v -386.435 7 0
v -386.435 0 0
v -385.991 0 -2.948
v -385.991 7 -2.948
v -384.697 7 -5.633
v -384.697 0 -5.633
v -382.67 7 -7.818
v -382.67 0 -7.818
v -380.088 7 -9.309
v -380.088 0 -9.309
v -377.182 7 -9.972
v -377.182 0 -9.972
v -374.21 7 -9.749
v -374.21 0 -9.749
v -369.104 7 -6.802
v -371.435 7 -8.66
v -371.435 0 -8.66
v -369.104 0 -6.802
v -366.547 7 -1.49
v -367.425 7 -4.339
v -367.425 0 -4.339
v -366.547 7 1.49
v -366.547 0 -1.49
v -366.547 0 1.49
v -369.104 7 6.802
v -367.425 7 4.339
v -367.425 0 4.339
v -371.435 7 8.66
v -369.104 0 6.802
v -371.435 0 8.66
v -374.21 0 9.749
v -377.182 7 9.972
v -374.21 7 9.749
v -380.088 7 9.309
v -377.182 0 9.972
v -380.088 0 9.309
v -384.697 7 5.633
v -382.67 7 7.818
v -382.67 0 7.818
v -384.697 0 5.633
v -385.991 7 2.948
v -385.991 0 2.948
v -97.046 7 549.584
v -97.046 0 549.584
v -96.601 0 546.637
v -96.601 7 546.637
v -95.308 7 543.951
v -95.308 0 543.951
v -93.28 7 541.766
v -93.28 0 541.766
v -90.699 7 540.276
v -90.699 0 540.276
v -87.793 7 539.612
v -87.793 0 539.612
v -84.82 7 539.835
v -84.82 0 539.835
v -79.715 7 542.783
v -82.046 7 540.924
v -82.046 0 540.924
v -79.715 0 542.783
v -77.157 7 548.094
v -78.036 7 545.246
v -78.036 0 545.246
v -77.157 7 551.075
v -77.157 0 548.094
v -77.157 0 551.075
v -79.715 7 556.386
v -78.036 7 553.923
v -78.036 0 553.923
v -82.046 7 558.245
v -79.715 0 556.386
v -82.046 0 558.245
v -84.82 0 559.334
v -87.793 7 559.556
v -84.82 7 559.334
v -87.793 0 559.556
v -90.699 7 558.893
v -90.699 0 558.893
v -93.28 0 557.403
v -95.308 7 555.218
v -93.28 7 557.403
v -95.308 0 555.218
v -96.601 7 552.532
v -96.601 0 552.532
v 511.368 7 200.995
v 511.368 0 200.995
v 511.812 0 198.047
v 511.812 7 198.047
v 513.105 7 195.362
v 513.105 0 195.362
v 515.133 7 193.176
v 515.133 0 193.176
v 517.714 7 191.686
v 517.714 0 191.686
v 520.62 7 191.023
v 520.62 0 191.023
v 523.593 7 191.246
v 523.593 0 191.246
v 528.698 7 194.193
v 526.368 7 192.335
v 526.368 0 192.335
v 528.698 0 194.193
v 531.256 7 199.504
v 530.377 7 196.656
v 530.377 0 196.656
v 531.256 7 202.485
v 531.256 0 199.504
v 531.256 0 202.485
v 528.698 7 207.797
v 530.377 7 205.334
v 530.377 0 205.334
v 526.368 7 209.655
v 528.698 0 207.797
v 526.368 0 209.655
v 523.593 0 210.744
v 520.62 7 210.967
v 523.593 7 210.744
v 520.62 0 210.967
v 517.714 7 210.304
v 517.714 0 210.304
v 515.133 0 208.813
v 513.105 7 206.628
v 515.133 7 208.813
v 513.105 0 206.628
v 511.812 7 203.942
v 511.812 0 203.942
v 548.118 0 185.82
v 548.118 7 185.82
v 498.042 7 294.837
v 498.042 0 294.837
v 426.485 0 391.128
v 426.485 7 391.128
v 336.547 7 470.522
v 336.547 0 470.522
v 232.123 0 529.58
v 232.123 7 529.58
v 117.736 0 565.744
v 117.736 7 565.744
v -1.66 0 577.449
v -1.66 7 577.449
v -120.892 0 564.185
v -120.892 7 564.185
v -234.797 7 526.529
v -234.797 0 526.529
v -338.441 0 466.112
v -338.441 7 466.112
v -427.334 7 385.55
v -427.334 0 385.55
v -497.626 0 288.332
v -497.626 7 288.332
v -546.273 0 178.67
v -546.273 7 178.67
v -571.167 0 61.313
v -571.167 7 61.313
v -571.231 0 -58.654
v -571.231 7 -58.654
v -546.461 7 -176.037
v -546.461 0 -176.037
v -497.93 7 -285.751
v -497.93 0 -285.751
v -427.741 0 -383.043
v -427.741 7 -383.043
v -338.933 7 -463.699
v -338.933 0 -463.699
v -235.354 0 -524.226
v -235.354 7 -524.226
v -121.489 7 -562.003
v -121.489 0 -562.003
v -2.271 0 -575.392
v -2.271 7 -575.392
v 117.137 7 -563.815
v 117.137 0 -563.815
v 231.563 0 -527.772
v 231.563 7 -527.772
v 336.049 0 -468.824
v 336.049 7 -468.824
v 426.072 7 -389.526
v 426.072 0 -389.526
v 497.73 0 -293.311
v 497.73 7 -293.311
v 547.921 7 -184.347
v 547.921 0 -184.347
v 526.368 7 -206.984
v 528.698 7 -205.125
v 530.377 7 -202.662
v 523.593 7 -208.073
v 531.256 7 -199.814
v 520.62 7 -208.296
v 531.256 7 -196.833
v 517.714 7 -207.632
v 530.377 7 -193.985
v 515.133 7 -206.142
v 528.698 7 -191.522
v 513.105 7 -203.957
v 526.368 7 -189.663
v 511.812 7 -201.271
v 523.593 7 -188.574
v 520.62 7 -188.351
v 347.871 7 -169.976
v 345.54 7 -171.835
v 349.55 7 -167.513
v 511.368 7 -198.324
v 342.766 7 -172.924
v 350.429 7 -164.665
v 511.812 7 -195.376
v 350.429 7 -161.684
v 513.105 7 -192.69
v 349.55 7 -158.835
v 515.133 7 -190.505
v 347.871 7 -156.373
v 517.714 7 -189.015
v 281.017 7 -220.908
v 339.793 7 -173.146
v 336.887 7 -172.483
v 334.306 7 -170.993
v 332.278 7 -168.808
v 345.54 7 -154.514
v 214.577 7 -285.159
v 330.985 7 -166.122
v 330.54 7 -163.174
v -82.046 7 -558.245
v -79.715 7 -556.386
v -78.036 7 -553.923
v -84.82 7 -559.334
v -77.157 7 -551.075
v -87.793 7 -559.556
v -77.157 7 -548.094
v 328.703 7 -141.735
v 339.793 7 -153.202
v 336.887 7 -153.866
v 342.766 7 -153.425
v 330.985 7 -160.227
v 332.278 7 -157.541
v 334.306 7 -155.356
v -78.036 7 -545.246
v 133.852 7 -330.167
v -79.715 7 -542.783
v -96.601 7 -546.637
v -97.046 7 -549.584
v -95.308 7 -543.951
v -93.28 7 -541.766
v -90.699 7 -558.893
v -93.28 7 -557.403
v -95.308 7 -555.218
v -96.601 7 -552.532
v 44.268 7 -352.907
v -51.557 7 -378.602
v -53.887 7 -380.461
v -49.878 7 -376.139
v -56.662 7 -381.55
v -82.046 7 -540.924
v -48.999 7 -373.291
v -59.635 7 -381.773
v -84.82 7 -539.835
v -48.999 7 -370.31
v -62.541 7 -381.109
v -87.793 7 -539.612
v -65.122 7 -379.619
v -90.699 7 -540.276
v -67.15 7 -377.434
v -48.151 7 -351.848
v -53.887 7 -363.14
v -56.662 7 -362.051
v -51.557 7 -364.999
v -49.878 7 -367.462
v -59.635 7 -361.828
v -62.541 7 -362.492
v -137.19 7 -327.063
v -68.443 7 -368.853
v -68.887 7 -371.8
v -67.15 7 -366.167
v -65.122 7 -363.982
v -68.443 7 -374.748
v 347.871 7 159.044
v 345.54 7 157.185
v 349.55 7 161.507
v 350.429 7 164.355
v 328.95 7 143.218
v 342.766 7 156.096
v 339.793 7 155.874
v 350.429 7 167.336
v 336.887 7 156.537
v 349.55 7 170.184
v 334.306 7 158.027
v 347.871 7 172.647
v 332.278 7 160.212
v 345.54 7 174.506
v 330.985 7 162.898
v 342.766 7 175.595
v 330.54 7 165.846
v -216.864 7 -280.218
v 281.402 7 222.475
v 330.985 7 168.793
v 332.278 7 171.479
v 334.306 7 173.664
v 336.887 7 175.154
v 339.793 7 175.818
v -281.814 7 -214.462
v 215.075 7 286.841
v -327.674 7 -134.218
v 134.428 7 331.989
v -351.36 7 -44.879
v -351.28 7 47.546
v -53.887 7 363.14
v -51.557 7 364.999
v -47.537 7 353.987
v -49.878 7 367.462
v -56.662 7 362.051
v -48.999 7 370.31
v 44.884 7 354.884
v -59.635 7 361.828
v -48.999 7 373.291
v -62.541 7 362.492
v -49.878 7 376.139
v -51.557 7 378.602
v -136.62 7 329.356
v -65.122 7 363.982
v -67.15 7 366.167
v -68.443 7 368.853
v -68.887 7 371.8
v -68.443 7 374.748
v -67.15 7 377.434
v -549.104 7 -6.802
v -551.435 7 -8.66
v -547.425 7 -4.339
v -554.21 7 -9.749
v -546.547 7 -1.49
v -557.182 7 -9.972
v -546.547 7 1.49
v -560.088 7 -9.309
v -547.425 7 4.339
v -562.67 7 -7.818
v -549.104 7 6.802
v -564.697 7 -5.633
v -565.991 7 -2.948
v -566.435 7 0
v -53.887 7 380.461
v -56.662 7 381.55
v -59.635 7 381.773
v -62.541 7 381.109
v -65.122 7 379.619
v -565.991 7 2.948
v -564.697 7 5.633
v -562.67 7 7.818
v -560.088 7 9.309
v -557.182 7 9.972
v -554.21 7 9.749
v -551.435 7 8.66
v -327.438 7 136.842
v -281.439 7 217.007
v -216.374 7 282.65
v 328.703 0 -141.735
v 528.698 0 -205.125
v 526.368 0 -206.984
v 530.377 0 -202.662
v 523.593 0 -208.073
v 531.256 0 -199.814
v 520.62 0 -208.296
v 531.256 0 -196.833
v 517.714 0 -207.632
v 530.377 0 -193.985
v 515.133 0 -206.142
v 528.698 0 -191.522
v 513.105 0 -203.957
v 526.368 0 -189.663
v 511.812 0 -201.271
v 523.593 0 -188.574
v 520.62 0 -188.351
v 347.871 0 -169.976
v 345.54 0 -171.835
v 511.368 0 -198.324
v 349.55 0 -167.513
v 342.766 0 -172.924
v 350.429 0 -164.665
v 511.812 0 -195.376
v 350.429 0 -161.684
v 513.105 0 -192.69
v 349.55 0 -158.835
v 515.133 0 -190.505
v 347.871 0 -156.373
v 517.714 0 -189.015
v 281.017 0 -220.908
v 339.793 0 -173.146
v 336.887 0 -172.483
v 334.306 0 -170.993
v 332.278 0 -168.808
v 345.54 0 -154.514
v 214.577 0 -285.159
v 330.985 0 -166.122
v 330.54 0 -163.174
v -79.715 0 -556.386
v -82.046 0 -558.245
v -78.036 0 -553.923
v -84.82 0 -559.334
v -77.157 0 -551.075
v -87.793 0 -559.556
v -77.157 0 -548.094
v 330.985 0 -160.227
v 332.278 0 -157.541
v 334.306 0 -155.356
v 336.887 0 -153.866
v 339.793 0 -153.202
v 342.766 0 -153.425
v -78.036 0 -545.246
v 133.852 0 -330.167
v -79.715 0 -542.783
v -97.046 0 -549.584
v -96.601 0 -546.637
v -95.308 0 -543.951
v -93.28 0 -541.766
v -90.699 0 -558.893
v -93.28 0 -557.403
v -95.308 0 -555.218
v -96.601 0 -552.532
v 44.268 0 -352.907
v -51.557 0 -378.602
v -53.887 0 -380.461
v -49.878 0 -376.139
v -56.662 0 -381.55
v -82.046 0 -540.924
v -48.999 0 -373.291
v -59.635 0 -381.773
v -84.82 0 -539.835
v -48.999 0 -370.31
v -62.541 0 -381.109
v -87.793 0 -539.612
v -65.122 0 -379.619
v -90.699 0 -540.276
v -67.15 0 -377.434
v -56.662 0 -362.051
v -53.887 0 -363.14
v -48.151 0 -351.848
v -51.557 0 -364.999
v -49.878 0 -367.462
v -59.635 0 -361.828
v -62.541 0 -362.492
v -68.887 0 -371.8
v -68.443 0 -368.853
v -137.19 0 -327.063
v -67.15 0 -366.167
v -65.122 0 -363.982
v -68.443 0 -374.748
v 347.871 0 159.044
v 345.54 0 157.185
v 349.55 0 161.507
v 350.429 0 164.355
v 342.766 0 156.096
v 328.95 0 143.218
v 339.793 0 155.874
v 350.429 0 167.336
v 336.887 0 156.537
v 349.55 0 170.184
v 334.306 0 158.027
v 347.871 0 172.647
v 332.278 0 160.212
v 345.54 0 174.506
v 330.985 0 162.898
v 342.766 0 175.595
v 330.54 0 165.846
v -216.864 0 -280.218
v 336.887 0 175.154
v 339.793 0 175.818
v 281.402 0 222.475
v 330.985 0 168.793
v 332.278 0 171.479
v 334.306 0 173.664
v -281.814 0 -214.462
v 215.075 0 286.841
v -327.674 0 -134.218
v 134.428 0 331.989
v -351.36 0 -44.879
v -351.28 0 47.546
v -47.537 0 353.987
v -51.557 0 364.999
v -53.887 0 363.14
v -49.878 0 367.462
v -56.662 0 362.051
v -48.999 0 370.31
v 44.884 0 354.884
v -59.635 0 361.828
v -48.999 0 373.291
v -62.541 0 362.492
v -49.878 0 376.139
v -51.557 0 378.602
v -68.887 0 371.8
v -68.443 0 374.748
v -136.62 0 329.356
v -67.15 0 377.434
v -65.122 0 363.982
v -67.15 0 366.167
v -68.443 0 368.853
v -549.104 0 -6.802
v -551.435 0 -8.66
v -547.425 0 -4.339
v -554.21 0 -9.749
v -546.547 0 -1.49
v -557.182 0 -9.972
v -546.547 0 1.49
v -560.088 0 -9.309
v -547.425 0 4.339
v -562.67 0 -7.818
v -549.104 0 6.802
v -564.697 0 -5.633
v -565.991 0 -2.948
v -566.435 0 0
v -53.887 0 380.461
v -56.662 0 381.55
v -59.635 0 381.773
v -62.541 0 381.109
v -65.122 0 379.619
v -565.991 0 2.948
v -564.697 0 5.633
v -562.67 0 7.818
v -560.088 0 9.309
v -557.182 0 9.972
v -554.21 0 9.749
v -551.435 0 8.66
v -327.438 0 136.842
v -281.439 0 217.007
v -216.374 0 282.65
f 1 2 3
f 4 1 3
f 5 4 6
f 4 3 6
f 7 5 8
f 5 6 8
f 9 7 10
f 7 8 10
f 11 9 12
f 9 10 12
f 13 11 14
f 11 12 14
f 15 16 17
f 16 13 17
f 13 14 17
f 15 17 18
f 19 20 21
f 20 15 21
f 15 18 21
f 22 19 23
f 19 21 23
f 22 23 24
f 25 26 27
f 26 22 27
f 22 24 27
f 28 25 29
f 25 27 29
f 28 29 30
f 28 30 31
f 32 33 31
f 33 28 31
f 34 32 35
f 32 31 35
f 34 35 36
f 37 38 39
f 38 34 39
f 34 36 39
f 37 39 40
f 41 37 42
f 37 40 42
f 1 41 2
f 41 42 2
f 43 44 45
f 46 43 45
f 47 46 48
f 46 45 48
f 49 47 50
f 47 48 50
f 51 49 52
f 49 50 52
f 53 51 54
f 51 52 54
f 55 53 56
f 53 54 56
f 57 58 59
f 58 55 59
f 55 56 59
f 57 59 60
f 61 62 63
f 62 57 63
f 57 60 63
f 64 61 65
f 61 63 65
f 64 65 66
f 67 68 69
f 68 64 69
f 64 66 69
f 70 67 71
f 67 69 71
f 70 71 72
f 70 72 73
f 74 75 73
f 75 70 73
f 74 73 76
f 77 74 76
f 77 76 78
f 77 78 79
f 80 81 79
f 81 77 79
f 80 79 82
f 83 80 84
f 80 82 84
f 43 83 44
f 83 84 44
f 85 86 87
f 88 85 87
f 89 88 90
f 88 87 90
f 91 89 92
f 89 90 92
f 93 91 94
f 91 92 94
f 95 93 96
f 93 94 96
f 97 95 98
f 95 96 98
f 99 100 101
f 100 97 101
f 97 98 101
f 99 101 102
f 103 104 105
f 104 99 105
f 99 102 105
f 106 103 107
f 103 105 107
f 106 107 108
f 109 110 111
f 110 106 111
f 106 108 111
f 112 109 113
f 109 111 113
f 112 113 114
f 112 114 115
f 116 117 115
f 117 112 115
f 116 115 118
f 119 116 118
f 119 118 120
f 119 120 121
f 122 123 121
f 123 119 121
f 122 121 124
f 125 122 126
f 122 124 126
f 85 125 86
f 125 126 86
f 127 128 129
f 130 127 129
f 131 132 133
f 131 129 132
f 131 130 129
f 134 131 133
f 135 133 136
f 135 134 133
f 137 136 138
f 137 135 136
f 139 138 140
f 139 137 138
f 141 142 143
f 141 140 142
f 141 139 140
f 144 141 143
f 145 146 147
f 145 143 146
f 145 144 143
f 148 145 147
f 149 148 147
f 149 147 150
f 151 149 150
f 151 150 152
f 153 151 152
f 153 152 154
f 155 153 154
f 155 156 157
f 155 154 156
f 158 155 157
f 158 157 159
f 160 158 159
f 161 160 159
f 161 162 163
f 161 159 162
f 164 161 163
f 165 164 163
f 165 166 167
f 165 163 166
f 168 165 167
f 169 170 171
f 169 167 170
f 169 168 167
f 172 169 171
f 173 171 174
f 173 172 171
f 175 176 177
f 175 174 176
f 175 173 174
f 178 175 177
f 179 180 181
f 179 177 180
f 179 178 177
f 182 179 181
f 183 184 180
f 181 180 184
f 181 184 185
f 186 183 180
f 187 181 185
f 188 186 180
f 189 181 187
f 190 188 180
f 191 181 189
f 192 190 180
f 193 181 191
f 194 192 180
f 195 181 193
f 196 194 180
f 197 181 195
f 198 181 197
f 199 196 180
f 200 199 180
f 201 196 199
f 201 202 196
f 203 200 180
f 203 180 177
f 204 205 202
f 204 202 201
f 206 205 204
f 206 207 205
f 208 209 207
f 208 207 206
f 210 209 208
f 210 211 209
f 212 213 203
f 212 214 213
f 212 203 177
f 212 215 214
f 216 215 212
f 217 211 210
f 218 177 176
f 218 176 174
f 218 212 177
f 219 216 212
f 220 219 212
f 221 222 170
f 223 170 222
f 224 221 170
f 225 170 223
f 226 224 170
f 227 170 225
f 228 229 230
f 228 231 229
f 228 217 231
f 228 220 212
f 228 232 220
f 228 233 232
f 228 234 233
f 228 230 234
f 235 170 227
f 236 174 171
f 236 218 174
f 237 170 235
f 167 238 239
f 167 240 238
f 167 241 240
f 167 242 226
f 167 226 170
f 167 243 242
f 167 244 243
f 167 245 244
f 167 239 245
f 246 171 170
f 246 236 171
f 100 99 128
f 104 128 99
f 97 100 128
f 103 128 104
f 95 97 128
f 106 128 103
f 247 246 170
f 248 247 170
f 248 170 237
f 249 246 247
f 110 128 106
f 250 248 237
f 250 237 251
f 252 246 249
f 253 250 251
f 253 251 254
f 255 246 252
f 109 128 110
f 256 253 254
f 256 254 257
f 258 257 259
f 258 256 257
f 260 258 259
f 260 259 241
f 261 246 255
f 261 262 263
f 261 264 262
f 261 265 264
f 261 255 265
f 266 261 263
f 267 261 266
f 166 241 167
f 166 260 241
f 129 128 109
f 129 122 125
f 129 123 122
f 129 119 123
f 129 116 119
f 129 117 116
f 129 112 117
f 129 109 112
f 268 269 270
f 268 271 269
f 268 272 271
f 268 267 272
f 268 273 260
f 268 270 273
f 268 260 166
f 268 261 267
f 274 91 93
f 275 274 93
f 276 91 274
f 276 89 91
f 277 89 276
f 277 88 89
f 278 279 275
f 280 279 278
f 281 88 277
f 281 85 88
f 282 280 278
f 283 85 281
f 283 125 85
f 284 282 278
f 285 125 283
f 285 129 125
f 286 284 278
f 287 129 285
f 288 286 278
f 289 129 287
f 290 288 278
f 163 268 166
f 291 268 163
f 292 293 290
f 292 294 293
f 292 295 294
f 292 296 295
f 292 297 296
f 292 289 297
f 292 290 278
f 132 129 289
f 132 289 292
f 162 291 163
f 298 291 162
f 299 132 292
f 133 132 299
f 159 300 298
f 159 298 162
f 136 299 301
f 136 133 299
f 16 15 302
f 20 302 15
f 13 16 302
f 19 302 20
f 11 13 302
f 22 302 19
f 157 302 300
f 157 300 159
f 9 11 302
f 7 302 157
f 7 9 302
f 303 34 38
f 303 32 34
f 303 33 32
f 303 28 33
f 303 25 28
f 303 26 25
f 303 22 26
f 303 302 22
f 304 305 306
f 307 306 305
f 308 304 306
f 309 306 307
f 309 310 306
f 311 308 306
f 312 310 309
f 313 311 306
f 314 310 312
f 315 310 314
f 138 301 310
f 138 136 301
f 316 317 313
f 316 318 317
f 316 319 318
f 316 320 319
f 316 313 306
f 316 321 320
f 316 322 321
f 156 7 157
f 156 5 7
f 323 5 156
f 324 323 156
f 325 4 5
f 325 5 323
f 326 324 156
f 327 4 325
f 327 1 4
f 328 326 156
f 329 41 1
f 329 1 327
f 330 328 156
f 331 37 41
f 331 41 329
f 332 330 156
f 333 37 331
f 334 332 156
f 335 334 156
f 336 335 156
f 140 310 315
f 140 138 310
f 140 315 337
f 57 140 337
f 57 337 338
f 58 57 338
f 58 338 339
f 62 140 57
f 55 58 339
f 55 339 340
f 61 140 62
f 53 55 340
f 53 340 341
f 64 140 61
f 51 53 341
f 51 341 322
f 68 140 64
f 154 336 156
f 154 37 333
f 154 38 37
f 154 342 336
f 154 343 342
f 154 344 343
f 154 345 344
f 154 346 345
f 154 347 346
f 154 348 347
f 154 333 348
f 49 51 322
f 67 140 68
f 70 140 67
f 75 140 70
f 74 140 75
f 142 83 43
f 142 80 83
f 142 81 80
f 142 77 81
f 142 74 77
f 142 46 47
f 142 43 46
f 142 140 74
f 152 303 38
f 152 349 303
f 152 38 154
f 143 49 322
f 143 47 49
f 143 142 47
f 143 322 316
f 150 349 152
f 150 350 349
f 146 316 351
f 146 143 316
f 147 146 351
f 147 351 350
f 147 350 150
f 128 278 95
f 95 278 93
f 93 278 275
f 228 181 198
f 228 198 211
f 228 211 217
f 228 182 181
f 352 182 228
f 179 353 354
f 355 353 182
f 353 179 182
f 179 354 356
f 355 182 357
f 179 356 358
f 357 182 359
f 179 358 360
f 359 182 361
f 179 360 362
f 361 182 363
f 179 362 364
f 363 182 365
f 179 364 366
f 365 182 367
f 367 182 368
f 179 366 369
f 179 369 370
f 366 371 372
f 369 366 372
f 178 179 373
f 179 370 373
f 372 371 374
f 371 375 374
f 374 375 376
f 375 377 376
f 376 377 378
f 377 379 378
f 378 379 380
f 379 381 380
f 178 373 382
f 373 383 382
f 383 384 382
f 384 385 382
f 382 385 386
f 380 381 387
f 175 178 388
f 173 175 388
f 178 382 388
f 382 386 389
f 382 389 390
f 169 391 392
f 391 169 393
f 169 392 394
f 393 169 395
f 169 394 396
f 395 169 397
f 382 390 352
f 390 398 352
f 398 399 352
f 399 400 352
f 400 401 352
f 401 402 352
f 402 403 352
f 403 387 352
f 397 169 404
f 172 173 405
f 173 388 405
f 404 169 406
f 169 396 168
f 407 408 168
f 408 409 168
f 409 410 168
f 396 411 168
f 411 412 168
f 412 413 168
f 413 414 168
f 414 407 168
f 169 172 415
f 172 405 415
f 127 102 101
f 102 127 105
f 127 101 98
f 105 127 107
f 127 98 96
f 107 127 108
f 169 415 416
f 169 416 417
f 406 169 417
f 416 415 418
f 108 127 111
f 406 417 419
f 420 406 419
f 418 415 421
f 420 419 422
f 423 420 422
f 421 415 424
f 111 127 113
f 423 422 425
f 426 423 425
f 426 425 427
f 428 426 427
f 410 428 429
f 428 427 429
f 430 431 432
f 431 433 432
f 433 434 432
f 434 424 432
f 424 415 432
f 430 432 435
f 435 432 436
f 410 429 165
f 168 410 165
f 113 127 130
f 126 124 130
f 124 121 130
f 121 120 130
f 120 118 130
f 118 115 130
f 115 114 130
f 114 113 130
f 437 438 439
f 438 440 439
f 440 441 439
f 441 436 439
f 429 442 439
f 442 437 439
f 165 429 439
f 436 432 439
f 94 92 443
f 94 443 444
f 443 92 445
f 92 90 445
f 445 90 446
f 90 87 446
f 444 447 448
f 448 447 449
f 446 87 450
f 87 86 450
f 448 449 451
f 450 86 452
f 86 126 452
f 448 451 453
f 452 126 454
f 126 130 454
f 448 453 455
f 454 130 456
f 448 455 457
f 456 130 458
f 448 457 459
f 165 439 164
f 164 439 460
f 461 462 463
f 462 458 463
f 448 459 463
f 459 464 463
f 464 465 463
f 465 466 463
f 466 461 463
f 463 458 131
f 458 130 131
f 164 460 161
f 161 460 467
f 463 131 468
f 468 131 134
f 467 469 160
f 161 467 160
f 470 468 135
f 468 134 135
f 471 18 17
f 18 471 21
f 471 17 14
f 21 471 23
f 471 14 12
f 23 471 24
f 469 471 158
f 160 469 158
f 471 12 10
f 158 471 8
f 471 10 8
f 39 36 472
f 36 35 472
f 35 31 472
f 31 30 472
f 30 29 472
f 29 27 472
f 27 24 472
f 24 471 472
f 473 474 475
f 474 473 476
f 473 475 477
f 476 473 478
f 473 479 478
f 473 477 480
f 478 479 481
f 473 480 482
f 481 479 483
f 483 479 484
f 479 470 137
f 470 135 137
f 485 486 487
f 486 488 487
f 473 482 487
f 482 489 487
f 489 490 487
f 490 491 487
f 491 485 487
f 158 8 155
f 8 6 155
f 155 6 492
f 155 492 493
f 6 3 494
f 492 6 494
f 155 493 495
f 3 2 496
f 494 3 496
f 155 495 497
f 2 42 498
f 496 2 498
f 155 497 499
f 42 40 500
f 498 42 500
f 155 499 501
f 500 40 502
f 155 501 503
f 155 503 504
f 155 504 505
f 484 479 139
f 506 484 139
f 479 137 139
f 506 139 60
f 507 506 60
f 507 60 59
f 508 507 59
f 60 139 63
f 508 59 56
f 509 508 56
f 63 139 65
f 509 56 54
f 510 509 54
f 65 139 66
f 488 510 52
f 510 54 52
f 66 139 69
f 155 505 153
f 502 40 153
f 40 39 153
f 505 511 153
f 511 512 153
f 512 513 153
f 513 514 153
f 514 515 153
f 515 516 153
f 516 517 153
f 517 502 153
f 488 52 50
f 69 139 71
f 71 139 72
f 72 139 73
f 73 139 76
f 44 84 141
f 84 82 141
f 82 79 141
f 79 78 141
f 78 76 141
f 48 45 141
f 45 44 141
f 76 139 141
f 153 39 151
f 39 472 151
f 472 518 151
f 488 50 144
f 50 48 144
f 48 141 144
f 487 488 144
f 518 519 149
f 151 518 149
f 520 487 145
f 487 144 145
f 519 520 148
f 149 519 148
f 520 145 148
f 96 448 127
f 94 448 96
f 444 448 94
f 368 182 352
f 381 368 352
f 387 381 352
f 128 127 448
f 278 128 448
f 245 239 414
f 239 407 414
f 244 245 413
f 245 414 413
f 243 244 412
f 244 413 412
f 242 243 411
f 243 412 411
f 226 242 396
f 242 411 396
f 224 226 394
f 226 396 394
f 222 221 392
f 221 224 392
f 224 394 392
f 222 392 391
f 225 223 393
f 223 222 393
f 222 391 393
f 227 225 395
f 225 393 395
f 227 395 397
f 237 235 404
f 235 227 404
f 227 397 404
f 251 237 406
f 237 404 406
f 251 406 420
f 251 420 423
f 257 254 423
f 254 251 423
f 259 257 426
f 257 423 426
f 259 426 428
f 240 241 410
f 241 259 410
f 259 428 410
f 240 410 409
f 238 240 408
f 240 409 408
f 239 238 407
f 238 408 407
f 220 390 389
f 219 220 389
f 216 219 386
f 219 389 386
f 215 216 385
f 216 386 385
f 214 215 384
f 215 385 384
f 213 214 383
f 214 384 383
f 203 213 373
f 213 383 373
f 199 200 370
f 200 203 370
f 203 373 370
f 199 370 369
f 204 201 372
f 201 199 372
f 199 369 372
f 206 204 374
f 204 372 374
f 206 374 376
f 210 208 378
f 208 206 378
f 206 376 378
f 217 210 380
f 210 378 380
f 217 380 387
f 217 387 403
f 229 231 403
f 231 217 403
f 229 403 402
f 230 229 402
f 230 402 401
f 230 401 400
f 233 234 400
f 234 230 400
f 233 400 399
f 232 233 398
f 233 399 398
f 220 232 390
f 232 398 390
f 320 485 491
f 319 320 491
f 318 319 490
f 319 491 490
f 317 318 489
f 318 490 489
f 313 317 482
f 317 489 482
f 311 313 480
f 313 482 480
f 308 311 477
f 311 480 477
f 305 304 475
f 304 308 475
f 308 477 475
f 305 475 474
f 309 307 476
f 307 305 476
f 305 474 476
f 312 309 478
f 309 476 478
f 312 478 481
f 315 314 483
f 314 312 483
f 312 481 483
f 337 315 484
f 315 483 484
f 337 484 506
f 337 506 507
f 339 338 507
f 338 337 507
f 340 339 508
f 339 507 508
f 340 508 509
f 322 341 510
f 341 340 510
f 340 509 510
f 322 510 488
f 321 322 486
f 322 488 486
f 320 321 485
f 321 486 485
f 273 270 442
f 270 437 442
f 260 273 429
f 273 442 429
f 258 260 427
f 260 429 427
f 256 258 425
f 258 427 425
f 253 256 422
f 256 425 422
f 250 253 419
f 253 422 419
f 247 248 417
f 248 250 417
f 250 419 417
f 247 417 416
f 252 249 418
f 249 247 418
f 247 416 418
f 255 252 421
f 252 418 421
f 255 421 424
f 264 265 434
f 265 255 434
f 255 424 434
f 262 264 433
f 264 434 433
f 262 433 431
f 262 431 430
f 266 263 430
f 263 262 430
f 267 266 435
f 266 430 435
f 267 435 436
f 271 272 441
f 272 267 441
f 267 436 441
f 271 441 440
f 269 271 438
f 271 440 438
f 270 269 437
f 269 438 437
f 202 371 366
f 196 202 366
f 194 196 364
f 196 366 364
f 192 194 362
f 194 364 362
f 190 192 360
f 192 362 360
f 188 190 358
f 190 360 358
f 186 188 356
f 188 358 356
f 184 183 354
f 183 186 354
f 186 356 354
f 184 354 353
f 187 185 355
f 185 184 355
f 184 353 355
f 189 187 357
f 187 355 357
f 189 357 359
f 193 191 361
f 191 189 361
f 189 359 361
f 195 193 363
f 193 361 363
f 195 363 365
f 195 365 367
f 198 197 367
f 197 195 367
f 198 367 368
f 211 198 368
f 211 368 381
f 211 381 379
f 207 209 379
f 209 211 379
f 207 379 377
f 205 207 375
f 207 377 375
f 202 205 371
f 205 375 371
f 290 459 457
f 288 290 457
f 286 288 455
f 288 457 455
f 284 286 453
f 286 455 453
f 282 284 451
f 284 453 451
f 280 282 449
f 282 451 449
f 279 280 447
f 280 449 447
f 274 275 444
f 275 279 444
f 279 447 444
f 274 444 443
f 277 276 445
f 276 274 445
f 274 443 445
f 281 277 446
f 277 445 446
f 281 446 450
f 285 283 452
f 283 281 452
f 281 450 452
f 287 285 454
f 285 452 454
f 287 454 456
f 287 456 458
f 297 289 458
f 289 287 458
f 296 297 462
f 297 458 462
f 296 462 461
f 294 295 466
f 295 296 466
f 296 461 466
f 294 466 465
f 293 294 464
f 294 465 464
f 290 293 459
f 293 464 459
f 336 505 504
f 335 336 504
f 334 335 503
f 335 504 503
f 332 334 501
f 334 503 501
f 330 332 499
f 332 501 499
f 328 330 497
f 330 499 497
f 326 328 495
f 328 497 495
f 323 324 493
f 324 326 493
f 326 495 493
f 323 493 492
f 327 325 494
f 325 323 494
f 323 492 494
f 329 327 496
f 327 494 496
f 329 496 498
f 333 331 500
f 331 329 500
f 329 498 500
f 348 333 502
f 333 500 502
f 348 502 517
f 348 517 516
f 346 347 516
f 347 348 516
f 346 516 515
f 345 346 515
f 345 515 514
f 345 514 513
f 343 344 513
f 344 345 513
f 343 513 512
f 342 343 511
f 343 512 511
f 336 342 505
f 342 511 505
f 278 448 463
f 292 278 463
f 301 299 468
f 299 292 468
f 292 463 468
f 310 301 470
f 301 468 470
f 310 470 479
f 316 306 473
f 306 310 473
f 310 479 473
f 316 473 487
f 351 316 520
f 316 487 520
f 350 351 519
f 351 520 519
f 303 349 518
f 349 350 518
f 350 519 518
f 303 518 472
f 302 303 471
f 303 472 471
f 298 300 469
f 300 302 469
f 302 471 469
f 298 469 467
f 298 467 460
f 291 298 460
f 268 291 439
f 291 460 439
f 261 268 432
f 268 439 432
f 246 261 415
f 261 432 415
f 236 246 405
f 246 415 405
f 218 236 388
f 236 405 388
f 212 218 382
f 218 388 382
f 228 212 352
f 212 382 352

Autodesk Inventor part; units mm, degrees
ref_plane "YZ Plane" through (0, 0, 0) normal (1, 0, 0) x (0, 1, 0)
ref_plane "XZ Plane" through (0, 0, 0) normal (0, 1, 0) x (-1, 0, 0)
ref_plane "XY Plane" through (0, 0, 0) normal (0, 0, 1) x (1, 0, 0)
sketch "Sketch1" plane through (0, 0, 0) normal (0, 1, 0) x (-1, 0, 0)
  line L0 (-548.1175, 185.8202) -> (-328.9504, 143.2184)
  line L1 (-547.9214, -184.3469) -> (-328.7026, -141.7351)
  arc A0 (-547.9214, -184.3469) -> (-548.1175, 185.8202) centre (-2.1062, 1.0257) ccw
  arc A1 (-328.7026, -141.7351) -> (-328.9504, 143.2184) centre (-2.1062, 1.0257) ccw
  circle A2 centre (-340.5404, 165.8456) radius 10
  circle A3 centre (-521.3675, 200.9948) radius 10
  line L2 (-296.1915, 1.3356) -> (-698.7298, 1.3356)
  circle A4 centre (-340.5404, -163.1743) radius 10
  circle A5 centre (-521.3675, -198.3235) radius 10
  circle A6 centre (376.435, 0) radius 10
  circle A7 centre (556.435, 0) radius 10
  circle A8 centre (58.8874, 371.8005) radius 10
  circle A9 centre (87.0456, 549.5844) radius 10
  circle A10 centre (58.8874, -371.8005) radius 10
  circle A11 centre (87.0456, -549.5844) radius 10
  point P0 (0, 0)
  dimension "d34" = 1152.87
  dimension "d48" = 712.87
  dimension "d52" = 20
  dimension "d53" = 20
  dimension "d54" = 376.435
  dimension "d55" = 20
  dimension "d56" = 20
  dimension "d58" = 556.435
  dimension "d59" = 20
  dimension "d60" = 376.435
  dimension "d61" = 20
  dimension "d62" = 556.435
  dimension "d65" = 81
  dimension "d69" = 81
extrude "Extrusion1" add sketch "Sketch1" along normal blind 7
properties part number "Shelf"
